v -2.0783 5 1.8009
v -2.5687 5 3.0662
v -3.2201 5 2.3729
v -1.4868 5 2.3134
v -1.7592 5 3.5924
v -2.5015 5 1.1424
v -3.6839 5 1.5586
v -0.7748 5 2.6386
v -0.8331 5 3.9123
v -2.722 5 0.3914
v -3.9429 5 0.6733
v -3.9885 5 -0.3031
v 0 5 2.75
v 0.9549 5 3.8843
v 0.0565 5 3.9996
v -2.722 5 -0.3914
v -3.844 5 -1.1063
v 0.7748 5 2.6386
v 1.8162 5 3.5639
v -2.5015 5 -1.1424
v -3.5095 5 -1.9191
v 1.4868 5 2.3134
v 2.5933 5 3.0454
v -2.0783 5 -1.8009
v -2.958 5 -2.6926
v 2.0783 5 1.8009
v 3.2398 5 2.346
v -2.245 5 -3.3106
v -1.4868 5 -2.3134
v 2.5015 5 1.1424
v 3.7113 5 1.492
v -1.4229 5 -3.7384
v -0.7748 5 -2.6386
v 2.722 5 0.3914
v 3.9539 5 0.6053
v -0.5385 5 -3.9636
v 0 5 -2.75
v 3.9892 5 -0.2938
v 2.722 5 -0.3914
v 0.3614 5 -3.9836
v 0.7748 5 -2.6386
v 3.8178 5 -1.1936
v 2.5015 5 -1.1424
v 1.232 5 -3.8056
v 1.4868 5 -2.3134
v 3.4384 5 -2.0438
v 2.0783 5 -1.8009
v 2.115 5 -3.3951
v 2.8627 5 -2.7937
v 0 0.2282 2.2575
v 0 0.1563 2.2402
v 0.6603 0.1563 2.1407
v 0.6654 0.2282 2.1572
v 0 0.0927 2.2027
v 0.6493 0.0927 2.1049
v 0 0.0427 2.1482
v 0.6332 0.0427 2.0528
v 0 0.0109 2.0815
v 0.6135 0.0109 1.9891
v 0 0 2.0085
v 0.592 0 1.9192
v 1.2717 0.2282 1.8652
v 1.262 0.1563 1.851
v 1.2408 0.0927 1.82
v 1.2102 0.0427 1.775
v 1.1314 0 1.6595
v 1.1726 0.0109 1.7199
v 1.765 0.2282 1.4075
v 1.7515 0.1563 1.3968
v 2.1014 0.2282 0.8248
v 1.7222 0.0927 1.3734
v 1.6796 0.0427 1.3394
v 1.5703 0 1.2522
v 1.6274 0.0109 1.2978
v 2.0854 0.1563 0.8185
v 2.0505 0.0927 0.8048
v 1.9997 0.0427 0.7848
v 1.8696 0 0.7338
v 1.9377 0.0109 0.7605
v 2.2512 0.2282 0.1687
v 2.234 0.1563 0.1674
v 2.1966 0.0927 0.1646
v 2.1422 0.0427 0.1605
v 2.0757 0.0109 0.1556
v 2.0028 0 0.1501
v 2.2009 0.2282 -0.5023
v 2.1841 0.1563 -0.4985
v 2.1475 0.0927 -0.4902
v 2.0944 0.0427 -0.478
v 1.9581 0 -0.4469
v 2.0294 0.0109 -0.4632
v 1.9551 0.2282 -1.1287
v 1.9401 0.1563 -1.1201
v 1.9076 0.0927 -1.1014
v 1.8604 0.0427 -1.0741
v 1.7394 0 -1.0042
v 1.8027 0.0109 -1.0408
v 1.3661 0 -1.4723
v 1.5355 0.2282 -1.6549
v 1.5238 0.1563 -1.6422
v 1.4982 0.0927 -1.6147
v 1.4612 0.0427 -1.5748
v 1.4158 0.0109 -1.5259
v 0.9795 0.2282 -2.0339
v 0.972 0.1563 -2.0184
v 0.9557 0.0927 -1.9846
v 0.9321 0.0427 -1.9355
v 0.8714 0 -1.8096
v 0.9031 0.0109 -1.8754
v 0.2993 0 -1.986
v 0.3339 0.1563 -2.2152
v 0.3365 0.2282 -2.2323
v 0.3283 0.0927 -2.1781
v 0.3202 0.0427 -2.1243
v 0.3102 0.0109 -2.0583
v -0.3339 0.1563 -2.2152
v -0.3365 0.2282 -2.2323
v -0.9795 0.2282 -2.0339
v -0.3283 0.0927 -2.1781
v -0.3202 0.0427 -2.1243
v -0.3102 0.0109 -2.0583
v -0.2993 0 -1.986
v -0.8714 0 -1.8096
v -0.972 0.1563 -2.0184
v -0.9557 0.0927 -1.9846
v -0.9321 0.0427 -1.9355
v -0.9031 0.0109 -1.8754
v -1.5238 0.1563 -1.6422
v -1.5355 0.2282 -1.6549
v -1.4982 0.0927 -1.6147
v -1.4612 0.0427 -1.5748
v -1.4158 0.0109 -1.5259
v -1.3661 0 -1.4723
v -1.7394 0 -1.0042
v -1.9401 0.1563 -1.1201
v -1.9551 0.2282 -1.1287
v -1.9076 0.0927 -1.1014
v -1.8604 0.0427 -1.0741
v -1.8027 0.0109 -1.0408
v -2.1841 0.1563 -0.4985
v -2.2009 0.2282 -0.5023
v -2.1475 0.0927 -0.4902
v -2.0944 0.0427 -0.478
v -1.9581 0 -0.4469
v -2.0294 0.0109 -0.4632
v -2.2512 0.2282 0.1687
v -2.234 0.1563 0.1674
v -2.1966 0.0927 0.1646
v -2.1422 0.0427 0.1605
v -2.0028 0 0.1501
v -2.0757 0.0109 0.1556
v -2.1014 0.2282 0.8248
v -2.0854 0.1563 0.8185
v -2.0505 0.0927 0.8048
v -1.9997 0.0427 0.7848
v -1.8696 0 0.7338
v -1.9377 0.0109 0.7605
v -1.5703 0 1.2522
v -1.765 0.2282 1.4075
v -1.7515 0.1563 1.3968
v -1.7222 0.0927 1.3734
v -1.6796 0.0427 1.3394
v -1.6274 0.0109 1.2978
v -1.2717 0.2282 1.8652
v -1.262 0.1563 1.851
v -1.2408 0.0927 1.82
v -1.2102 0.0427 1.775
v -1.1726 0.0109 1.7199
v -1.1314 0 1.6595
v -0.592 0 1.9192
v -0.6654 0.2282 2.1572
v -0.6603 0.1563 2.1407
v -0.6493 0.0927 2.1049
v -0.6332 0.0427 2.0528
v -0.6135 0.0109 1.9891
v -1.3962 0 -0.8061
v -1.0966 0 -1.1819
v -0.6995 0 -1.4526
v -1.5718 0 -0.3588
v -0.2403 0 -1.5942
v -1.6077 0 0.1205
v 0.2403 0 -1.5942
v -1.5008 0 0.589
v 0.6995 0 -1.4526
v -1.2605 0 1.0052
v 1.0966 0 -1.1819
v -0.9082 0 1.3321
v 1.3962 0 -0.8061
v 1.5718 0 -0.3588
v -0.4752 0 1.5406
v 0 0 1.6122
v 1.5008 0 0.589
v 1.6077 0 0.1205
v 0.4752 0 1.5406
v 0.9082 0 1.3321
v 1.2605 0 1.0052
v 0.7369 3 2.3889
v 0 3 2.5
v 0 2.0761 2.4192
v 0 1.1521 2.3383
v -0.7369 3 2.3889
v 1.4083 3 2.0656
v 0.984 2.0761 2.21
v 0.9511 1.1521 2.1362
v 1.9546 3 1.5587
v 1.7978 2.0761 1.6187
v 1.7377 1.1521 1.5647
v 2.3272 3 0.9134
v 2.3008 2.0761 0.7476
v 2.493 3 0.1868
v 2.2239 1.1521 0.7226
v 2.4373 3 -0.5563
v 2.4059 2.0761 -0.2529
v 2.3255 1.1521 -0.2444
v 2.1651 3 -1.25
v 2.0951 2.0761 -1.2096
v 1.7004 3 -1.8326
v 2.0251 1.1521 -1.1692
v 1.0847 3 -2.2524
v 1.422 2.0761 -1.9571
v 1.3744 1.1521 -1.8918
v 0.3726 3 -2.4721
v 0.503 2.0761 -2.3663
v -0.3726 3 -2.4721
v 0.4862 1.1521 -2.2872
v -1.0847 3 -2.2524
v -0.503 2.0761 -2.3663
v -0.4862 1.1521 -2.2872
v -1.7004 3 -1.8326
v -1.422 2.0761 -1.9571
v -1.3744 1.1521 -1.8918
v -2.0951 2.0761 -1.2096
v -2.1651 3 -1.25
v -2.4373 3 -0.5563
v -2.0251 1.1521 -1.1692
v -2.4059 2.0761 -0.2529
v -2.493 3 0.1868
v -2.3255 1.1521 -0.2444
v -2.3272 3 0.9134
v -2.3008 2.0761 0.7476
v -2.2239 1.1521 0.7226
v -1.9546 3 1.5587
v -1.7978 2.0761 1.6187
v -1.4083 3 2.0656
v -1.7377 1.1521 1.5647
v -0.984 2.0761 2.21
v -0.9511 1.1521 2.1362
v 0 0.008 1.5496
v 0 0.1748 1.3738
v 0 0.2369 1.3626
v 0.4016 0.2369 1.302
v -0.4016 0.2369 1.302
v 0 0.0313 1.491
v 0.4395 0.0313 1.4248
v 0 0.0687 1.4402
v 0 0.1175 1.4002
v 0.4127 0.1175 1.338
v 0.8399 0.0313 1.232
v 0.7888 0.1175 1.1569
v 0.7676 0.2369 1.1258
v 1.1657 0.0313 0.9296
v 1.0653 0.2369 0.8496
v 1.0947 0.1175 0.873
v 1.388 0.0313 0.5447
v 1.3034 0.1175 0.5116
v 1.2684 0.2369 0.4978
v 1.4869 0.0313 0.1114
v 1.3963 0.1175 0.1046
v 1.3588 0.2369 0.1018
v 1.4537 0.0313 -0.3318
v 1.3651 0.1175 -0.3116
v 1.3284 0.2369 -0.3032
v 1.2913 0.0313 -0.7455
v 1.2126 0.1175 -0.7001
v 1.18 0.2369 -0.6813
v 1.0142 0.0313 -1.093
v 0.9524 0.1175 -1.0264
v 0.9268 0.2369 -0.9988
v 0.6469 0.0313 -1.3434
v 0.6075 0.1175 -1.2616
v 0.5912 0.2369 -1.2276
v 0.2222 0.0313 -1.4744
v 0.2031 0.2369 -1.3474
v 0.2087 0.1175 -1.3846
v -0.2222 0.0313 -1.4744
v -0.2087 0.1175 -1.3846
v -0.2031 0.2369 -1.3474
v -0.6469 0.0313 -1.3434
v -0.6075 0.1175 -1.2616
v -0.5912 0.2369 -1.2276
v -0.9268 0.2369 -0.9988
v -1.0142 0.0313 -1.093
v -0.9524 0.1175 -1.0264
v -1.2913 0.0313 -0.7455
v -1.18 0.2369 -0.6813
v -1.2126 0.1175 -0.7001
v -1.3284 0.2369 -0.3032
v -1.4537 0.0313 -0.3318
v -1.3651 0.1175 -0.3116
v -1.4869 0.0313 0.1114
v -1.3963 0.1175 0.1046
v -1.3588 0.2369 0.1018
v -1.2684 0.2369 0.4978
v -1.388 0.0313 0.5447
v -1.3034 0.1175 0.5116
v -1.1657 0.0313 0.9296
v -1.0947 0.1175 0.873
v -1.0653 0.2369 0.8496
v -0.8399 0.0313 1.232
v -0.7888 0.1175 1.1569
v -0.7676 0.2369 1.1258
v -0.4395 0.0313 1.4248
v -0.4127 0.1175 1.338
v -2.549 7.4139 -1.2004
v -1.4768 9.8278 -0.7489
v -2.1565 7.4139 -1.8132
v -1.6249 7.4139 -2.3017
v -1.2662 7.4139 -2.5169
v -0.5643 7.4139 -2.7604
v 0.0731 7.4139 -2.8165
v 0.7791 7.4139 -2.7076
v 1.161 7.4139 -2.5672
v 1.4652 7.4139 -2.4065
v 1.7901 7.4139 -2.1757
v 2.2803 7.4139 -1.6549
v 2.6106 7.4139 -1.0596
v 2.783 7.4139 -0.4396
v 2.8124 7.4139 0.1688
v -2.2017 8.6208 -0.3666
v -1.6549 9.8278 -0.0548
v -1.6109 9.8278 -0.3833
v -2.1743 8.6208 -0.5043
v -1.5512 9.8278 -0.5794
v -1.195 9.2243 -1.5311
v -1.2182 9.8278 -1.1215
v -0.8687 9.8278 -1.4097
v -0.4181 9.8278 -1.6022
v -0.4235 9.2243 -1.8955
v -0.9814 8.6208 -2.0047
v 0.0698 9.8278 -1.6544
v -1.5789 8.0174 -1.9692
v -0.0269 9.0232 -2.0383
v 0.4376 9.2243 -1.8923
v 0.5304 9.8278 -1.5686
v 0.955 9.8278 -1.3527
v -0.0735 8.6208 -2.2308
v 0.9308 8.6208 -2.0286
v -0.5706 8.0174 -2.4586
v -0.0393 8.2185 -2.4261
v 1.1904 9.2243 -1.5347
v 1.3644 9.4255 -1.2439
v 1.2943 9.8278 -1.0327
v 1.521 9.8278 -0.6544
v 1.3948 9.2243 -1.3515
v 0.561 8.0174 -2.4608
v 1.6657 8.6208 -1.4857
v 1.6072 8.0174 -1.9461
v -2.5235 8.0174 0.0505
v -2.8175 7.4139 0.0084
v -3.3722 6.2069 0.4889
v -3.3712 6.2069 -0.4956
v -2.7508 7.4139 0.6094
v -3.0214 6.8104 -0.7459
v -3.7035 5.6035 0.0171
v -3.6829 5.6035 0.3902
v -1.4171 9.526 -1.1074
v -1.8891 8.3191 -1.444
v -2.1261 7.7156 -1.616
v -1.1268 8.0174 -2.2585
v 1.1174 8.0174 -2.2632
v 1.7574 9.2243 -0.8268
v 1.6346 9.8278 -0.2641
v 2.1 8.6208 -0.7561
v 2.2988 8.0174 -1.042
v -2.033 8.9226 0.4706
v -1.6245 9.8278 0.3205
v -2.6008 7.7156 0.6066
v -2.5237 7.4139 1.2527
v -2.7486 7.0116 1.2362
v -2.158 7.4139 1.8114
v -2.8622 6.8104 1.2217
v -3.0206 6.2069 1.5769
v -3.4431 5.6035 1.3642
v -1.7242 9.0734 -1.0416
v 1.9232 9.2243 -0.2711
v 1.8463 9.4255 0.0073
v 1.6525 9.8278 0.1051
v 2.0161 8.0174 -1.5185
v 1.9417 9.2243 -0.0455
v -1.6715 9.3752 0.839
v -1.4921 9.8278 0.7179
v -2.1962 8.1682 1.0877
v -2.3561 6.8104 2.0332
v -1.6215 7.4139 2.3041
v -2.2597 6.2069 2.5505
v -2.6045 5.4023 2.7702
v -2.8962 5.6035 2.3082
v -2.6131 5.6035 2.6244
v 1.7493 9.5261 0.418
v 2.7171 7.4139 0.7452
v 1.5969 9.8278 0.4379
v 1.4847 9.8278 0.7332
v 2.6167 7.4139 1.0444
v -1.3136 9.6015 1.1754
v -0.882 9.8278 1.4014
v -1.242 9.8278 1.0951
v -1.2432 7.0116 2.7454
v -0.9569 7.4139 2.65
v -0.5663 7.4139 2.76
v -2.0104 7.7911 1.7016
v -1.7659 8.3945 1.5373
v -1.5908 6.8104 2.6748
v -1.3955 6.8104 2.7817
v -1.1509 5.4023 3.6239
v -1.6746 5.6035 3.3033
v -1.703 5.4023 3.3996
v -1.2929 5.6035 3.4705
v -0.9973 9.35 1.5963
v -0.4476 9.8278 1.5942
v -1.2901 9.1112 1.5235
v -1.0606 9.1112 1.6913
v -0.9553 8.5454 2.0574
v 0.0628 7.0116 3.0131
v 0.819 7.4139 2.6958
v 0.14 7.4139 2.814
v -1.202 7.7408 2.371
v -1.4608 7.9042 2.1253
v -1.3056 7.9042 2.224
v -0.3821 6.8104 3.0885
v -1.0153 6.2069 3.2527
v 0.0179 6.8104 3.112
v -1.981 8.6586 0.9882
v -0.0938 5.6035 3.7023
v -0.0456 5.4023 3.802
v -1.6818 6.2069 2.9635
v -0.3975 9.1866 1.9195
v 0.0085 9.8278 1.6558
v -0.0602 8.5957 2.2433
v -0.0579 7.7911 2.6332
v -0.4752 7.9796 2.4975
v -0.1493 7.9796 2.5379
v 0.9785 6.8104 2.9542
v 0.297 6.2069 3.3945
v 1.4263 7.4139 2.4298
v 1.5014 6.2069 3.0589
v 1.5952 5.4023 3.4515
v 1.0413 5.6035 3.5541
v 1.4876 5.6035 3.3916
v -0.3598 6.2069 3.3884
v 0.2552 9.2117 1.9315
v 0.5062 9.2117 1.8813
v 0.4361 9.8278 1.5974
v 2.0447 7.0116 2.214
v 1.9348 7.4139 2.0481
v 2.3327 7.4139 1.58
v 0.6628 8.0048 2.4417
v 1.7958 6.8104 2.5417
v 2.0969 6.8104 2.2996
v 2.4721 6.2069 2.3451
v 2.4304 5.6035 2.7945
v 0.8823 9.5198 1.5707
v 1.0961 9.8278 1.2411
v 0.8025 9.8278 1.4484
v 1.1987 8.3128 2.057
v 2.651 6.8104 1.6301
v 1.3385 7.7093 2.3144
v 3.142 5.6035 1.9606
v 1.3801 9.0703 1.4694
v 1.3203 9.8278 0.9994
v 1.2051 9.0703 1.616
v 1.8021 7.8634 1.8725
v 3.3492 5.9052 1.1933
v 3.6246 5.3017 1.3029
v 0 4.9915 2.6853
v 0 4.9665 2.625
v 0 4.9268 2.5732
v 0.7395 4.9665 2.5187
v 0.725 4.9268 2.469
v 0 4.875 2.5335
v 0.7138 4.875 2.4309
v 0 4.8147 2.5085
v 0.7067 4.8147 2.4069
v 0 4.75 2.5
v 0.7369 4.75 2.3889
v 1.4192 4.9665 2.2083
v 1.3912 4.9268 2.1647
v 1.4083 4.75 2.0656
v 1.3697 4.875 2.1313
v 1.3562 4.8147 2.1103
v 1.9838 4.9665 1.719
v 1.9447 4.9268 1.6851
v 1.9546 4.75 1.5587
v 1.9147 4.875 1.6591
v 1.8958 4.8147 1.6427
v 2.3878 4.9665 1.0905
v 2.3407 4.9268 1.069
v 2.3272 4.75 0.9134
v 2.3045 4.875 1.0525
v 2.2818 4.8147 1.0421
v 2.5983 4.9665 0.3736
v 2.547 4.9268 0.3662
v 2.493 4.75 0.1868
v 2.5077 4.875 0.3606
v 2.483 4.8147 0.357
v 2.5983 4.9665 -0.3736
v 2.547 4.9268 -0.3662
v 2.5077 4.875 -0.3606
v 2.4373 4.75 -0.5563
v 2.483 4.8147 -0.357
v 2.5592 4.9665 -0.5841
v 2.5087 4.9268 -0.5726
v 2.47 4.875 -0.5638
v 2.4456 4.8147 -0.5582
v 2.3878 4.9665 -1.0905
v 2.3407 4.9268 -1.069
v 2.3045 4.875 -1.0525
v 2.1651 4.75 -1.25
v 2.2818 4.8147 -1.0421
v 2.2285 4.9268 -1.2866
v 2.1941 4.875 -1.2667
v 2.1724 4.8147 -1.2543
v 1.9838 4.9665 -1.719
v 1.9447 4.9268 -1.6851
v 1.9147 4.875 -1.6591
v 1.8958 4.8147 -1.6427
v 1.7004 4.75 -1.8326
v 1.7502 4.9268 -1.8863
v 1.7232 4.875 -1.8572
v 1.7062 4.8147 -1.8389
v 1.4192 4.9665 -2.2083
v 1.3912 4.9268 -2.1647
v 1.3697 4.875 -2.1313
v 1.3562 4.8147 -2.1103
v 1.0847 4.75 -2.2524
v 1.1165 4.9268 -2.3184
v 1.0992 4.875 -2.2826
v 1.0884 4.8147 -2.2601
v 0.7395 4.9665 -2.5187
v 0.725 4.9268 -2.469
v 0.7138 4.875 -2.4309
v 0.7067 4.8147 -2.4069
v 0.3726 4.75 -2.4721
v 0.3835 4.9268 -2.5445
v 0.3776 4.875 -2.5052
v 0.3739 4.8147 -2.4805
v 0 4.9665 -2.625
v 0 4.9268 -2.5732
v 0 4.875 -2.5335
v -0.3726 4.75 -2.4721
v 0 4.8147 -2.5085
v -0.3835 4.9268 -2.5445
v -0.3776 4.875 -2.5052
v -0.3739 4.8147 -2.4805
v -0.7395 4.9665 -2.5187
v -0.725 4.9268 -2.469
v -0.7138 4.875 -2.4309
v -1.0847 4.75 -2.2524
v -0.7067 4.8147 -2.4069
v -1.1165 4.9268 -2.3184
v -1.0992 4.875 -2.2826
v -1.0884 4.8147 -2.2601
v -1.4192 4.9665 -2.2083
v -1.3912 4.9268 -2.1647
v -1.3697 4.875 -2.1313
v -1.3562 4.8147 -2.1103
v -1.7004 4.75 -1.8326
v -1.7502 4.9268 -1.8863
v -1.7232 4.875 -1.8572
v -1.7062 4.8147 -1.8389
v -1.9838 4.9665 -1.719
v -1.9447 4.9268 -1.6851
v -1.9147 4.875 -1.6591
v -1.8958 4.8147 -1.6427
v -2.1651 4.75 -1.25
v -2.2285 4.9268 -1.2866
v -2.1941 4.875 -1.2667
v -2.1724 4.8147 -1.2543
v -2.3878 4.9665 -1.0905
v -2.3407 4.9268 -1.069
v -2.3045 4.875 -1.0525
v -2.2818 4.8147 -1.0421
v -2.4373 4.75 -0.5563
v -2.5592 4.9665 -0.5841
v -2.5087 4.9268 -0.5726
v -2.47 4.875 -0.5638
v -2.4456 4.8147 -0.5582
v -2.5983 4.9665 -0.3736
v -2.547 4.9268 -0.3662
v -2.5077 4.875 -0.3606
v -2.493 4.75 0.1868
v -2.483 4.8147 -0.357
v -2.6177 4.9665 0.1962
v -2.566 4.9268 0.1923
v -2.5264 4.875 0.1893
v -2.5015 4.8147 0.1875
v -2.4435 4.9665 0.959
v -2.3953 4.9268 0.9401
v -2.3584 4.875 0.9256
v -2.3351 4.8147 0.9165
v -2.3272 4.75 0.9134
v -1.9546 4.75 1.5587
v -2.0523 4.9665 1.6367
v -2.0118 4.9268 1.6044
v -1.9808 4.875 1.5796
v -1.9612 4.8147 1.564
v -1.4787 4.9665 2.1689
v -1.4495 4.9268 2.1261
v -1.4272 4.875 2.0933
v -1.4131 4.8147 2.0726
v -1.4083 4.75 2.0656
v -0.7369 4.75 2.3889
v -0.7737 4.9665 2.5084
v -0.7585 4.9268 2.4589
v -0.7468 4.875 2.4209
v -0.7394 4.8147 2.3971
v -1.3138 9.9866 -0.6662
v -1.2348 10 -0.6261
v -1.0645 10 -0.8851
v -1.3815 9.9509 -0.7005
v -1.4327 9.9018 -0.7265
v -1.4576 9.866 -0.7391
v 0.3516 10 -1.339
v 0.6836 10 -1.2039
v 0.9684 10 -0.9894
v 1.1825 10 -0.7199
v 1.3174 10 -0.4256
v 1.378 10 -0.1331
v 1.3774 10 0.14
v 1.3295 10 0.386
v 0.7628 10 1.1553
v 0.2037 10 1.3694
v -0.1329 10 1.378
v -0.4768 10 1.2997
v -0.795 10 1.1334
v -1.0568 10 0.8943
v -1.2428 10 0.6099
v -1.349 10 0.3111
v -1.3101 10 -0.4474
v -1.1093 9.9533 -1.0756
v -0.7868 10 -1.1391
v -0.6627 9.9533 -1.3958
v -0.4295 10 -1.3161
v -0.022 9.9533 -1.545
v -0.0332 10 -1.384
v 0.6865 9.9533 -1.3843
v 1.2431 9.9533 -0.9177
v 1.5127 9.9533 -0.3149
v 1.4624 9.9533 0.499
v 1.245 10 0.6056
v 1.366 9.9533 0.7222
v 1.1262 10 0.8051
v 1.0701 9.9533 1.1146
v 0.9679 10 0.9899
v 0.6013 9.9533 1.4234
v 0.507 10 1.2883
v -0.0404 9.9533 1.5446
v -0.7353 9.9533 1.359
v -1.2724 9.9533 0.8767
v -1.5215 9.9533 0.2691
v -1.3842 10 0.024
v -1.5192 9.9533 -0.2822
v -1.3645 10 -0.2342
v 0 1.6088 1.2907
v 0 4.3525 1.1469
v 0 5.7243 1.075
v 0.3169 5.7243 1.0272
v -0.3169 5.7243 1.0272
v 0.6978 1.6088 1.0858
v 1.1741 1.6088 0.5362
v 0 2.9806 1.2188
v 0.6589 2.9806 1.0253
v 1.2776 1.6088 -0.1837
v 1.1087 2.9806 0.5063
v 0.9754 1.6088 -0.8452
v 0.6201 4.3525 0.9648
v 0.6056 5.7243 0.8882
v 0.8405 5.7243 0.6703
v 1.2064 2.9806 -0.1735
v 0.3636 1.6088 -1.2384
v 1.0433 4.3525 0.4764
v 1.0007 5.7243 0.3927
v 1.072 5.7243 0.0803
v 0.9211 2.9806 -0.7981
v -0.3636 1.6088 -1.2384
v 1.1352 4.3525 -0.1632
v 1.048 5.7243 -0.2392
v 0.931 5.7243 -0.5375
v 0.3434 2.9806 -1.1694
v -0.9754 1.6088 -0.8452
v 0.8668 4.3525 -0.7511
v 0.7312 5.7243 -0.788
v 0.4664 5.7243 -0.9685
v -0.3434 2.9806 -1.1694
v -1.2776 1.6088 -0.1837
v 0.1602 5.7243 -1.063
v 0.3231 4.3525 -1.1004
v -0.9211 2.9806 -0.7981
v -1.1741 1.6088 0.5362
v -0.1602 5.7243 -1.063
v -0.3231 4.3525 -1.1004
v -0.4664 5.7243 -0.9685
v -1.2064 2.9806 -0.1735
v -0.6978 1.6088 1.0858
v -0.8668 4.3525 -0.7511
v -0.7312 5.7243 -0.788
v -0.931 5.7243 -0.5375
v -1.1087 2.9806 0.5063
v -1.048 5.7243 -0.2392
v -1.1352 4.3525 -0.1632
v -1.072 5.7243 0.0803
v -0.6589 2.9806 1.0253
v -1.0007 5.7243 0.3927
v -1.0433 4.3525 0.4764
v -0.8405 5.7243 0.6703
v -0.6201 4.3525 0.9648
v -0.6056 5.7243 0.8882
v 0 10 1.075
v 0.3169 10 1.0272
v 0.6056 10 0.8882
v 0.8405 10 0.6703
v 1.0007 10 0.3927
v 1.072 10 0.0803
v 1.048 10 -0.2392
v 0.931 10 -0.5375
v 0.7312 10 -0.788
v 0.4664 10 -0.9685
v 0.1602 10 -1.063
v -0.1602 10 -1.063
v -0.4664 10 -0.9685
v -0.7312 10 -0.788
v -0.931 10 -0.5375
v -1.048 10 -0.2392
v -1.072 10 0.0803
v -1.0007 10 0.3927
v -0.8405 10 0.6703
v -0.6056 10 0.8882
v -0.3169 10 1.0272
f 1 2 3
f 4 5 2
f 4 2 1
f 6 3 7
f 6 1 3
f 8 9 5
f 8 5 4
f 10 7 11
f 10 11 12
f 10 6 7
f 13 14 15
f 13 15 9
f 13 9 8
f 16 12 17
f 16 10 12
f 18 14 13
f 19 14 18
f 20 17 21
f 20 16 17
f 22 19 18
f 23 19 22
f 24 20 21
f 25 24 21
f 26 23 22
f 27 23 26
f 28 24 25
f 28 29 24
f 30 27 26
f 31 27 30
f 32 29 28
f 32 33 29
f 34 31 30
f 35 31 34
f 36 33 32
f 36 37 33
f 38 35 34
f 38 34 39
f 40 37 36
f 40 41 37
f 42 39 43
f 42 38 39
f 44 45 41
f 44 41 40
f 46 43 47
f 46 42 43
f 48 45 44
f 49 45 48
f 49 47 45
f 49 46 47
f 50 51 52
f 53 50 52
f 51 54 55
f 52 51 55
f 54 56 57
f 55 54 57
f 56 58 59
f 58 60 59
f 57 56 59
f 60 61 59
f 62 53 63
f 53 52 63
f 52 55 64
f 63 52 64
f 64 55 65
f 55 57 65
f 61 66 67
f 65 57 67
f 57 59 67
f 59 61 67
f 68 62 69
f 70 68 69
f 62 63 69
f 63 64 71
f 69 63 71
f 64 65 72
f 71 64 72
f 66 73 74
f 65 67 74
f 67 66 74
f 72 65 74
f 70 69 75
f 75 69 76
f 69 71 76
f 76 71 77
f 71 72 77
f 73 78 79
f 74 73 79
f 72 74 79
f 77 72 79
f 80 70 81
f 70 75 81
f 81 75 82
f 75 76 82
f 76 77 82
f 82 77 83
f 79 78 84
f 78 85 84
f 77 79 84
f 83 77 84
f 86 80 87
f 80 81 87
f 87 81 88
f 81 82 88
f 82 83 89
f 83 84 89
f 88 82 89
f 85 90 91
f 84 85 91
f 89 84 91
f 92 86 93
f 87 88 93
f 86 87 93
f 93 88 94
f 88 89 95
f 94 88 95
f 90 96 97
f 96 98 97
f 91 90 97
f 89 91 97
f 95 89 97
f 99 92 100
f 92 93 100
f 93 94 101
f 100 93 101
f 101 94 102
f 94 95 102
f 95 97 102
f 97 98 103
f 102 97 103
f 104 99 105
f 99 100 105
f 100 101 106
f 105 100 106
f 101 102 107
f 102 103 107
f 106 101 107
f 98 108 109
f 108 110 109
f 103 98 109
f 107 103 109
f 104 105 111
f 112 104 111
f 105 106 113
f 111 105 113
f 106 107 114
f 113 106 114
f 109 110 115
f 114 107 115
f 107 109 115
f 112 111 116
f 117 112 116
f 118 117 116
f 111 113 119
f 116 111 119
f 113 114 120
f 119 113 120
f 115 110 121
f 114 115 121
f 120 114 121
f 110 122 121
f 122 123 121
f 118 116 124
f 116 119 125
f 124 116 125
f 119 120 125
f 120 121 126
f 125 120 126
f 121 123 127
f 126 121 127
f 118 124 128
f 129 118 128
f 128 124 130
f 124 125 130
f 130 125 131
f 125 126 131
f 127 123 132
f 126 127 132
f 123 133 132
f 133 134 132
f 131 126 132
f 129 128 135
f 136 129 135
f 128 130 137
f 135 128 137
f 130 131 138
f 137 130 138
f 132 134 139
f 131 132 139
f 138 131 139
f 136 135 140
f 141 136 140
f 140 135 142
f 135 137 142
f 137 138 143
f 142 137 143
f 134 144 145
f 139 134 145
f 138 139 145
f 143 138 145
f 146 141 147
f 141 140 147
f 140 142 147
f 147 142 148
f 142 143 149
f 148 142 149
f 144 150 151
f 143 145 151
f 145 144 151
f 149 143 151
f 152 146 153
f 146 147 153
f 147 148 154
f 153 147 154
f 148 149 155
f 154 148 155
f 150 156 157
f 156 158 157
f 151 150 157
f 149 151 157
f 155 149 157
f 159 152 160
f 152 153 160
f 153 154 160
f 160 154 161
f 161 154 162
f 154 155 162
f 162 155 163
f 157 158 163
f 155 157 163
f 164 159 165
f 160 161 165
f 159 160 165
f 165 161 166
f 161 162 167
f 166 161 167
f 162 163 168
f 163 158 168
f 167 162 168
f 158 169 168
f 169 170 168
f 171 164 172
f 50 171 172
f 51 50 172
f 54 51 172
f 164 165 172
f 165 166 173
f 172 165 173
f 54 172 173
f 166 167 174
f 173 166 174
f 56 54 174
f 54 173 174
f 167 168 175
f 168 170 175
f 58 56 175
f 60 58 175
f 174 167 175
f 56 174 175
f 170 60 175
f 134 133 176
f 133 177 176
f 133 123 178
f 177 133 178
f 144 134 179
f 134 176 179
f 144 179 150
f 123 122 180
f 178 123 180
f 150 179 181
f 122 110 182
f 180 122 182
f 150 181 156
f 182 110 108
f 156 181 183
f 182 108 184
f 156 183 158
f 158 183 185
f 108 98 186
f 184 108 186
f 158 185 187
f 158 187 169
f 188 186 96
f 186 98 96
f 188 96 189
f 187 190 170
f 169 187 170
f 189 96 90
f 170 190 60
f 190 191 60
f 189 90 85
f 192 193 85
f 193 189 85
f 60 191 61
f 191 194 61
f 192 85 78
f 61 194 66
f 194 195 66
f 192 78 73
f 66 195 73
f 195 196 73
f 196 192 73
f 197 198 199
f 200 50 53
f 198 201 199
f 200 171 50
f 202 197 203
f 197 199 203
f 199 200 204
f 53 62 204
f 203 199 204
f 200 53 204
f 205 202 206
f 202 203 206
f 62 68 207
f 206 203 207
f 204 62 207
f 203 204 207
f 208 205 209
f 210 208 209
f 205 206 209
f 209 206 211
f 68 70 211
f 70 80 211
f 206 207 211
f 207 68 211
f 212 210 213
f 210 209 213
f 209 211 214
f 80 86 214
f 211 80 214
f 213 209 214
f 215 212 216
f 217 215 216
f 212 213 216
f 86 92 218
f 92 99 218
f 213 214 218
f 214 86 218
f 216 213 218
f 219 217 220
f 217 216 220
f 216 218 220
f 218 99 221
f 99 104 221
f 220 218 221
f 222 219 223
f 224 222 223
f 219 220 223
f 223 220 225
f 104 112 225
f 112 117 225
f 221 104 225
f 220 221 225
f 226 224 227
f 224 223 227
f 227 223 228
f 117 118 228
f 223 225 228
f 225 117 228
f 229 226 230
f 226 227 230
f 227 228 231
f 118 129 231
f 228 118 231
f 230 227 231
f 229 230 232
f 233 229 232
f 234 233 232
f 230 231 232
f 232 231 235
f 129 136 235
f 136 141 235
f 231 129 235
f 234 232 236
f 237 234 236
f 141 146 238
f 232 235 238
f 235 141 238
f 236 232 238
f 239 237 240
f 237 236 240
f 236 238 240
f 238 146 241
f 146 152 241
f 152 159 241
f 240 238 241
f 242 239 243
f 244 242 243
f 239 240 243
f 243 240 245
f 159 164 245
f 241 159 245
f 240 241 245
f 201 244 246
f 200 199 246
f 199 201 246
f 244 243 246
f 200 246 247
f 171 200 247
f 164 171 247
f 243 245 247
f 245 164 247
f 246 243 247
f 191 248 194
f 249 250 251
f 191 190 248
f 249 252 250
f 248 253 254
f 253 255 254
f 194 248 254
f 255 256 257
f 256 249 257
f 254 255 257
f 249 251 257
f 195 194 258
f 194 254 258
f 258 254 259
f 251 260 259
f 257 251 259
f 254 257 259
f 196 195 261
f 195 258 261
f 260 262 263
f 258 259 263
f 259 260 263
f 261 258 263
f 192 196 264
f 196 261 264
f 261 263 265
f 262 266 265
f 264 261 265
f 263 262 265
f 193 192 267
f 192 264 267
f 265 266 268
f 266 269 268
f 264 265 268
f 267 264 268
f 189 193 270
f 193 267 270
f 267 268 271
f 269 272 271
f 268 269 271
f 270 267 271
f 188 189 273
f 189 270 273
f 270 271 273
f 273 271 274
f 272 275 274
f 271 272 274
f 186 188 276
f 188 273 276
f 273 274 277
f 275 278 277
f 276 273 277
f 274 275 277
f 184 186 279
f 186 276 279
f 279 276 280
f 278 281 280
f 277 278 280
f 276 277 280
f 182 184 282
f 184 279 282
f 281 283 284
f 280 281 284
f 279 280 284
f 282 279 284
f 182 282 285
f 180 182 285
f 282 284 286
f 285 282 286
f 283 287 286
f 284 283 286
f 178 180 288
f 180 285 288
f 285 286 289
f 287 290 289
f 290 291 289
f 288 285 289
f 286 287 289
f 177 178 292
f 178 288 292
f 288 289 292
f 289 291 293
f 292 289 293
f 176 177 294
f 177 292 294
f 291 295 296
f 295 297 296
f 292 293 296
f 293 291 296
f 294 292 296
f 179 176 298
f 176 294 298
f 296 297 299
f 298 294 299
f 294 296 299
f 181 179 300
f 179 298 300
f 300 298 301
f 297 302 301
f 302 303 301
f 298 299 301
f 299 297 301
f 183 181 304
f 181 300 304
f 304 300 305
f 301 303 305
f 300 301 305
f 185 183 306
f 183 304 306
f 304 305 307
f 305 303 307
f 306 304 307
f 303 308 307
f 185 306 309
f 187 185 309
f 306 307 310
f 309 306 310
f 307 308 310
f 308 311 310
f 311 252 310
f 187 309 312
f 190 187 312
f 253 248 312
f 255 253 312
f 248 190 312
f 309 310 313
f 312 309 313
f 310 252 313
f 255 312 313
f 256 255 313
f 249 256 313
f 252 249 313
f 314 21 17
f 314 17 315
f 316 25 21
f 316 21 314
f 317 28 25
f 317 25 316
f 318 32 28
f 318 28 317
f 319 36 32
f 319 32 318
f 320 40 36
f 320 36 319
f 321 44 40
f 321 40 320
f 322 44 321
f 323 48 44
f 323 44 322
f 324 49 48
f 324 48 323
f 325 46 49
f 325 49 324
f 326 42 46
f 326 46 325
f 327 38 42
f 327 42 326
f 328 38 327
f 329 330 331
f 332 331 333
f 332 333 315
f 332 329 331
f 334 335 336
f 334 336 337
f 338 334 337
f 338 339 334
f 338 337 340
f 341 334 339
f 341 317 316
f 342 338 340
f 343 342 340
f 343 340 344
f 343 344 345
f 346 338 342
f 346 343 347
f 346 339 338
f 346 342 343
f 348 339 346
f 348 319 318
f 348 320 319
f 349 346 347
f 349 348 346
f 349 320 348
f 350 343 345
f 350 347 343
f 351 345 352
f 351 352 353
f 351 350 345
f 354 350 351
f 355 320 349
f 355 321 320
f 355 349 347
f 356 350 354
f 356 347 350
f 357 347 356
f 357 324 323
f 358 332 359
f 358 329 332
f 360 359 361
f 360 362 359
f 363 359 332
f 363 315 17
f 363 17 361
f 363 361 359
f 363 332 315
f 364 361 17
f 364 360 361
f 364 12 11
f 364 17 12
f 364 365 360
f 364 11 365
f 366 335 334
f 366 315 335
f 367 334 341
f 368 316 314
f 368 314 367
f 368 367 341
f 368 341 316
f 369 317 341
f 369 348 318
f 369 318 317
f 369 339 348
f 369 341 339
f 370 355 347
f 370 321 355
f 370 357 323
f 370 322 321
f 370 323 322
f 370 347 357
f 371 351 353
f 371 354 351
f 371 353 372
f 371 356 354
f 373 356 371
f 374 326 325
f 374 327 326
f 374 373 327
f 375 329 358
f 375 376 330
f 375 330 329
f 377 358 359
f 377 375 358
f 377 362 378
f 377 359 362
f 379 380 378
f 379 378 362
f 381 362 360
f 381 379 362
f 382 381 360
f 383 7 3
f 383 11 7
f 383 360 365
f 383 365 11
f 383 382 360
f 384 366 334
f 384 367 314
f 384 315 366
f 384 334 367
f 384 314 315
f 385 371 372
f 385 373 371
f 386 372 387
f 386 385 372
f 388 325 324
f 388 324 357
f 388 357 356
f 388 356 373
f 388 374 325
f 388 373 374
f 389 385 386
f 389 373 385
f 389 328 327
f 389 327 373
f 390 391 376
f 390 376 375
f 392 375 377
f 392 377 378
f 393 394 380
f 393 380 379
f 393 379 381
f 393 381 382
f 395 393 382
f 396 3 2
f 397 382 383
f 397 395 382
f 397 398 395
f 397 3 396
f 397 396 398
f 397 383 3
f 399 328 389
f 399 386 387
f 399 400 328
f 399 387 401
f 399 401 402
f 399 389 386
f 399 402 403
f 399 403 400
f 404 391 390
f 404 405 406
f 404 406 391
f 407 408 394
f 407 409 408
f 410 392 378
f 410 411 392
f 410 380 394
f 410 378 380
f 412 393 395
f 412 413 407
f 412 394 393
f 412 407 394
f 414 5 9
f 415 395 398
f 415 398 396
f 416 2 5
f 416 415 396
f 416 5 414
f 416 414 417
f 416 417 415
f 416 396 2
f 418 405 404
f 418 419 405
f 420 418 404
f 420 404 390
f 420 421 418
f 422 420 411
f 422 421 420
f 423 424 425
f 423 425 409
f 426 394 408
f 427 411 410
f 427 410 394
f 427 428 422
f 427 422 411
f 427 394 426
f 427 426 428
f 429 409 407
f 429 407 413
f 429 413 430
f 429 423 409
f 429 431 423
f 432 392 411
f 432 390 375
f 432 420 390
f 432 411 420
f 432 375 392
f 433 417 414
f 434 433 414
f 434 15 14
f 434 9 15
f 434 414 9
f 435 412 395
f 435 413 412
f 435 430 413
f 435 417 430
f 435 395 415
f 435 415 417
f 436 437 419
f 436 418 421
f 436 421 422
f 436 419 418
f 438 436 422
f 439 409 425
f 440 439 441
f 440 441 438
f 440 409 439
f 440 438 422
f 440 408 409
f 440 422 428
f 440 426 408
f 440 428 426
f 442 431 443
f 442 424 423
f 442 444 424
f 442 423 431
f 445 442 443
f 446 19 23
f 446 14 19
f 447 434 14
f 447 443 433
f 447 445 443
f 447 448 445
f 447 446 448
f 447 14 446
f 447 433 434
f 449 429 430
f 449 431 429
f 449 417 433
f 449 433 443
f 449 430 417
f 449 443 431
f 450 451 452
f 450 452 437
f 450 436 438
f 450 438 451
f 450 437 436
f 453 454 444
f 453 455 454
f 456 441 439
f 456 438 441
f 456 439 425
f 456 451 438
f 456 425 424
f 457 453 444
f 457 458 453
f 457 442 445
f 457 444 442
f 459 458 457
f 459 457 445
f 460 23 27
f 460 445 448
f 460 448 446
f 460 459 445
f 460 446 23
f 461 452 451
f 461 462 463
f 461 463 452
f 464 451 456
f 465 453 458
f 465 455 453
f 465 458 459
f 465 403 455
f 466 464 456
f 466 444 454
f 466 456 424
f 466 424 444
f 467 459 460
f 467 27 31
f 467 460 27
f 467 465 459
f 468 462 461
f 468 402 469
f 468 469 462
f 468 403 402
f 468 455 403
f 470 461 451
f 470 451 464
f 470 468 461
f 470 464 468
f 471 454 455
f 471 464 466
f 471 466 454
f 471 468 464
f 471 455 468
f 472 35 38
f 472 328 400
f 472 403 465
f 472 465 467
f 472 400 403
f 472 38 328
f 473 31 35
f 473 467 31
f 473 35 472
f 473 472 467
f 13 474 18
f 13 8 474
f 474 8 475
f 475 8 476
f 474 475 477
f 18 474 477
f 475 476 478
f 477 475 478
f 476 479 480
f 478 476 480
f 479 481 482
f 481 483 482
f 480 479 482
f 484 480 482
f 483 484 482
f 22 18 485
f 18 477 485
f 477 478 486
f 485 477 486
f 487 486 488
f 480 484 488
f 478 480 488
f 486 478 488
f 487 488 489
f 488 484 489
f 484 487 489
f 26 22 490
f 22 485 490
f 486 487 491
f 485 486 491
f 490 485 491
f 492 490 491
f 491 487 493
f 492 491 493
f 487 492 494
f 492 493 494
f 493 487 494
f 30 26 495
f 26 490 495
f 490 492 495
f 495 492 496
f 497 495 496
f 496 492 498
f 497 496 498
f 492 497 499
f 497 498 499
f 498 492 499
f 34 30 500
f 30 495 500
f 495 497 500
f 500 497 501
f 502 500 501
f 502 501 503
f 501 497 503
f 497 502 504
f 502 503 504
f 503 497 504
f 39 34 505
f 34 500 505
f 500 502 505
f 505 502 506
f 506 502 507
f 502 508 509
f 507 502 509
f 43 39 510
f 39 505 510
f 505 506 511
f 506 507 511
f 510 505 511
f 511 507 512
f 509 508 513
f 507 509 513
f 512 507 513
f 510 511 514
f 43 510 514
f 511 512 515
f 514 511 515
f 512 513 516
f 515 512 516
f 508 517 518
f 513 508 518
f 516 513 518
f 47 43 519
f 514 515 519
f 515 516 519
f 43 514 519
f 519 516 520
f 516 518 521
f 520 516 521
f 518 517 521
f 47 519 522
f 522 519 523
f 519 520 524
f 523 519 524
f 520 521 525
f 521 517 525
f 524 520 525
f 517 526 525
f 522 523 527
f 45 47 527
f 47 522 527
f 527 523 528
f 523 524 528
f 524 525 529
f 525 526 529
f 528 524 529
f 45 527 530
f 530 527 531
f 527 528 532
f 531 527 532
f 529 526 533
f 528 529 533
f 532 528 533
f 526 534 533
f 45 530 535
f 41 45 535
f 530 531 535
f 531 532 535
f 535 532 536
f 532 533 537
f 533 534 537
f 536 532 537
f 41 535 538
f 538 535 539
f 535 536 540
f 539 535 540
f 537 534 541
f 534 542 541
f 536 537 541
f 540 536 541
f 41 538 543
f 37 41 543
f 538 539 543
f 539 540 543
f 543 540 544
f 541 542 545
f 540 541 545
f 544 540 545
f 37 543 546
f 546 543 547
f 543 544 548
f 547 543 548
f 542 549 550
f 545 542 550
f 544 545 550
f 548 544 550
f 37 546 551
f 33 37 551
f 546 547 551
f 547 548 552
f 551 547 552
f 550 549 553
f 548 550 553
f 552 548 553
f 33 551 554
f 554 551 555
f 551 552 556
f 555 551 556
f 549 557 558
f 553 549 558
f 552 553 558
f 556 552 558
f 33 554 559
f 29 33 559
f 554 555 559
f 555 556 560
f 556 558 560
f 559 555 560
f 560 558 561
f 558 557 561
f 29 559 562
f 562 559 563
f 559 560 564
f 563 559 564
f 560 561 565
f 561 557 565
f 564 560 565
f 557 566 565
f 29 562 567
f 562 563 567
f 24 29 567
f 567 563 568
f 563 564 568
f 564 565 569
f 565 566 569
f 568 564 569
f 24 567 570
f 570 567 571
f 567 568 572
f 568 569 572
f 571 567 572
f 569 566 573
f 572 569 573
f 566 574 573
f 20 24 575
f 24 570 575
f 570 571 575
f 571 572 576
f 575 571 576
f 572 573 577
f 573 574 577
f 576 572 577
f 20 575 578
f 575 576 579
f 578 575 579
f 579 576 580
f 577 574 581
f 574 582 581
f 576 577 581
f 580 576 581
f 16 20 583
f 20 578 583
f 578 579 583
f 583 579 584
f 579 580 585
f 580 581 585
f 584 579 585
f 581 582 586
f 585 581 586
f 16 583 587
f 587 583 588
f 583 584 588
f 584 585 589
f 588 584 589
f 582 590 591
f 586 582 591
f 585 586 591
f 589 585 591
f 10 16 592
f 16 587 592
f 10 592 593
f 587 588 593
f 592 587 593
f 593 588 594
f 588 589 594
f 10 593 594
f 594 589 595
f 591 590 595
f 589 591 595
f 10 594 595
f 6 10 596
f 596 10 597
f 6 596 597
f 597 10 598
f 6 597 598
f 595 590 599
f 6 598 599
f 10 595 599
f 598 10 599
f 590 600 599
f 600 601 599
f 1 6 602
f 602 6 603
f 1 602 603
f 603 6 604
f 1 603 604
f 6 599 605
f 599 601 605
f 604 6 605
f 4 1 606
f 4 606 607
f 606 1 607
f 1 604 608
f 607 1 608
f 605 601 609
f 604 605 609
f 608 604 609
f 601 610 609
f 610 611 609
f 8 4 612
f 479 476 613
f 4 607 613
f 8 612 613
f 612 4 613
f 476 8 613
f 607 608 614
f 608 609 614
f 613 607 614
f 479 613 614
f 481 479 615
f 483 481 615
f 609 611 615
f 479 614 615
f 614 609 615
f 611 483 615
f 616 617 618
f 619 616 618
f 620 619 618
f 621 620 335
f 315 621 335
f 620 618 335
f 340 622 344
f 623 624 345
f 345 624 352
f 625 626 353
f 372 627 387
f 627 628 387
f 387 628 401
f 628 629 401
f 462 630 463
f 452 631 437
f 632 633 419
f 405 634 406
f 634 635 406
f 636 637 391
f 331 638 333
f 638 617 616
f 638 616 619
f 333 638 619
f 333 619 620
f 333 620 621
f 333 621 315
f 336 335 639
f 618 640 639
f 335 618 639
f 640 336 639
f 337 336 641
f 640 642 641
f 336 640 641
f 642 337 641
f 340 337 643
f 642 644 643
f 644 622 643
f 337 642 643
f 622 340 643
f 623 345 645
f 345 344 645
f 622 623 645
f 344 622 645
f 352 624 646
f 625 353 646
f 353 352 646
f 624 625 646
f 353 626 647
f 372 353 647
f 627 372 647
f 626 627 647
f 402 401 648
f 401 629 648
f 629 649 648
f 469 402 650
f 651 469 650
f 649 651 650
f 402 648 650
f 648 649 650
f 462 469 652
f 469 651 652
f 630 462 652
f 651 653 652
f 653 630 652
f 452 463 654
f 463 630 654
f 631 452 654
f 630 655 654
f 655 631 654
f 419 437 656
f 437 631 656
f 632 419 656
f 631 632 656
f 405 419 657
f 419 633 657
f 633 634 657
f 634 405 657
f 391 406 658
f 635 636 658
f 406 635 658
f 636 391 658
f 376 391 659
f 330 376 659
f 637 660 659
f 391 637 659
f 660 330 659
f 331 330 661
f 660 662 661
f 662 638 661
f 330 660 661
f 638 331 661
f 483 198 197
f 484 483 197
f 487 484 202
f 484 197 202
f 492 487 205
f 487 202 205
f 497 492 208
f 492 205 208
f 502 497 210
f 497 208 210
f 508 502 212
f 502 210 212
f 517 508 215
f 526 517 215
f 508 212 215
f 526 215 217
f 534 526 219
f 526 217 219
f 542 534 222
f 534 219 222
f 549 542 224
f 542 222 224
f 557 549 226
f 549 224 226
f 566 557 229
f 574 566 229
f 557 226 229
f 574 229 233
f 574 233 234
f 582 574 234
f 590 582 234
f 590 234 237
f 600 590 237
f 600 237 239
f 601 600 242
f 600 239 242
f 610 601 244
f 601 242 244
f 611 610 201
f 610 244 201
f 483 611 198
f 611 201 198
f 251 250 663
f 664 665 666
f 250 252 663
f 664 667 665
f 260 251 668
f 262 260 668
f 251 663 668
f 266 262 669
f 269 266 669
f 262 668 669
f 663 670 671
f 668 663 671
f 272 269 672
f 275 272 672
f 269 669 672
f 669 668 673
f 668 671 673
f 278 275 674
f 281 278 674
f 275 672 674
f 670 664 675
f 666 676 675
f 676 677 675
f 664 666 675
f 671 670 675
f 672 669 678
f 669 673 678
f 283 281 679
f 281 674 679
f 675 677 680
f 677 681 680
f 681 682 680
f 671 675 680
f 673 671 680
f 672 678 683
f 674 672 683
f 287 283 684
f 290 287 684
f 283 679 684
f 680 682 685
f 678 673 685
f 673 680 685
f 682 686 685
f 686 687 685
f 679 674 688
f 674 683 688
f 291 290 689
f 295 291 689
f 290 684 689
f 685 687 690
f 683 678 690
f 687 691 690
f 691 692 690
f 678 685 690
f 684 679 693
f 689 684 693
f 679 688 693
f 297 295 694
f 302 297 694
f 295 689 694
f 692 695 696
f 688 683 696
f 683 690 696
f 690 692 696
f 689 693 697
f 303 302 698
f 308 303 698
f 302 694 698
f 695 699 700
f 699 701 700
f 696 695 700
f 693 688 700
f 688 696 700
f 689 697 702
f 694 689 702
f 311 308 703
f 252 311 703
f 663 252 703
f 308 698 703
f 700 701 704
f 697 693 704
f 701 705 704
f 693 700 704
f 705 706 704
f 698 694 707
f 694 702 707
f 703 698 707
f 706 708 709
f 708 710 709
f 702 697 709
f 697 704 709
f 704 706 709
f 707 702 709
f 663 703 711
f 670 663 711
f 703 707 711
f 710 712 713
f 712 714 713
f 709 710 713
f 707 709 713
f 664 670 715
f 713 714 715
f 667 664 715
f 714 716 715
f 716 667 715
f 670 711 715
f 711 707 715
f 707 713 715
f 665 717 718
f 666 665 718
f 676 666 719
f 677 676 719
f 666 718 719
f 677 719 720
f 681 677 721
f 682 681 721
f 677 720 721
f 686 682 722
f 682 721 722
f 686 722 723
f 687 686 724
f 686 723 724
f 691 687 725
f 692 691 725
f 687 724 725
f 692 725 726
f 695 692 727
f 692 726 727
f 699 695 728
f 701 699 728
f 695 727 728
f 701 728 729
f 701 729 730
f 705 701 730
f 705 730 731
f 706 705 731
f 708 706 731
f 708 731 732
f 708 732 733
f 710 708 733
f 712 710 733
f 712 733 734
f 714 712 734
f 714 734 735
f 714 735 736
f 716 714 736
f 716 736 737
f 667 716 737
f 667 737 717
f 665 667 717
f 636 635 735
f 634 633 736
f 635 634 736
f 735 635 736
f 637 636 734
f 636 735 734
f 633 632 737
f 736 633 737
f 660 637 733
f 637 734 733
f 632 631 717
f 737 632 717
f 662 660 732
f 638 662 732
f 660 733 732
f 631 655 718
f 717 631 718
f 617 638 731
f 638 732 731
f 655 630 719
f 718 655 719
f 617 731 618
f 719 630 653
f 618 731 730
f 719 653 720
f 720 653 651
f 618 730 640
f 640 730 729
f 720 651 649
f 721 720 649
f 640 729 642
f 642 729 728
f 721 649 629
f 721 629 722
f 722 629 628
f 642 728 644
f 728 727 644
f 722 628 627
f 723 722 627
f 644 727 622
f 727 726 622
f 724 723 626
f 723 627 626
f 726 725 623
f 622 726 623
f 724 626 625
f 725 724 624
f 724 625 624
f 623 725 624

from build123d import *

# Parameters (mm, degrees)
SKETCH1_R           = 2.5
BOSS_EXTRUDE1_DEPTH = 5
SKETCH4_R           = 1.075
CUT_EXTRUDE1_DEPTH  = 12.489125363
CHAMFER1_SIZE       = 0.3
CHAMFER1_SIZE2      = 5.724341006
CHAMFER2_SIZE       = 3
CHAMFER2_SIZE2      = 0.262465991
FILLET1_R           = 0.3
FILLET2_R           = 0.25
FILLET4_R           = 0.25


with BuildPart() as part:
    # Sketch1 → Boss-Extrude1 (new body)
    with BuildSketch(Plane(origin=(0, 0, 0), x_dir=(1, 0, 0), z_dir=(0, 1, 0))):
        with Locations(Location((0, 0, 0), (0, 0, 270))):
            Circle(SKETCH1_R)
    extrude(amount=BOSS_EXTRUDE1_DEPTH)

    # Loft1: read off the stored shape, not the designer's step
    # Loft1: loft between two sections, ruled curve by curve
    loft1_from = [
        Edge.make_bspline([(-1.392393657, 10, -0.736114736), (0.079835815, 10, -3.52090205), (2.864623129, 10, -2.048672577), (1.392393657, 10, 0.736114736), (-0.079835815, 10, 3.52090205), (-2.864623129, 10, 2.048672577), (-1.392393657, 10, -0.736114736)], [0, 0, 0, 0, 0.5, 0.5, 0.5, 1, 1, 1, 1], 3, [1, 0.333333333, 0.333333333, 1, 0.333333333, 0.333333333, 1]),
    ]
    loft1_to = [
        Edge.make_bspline([(-3.843967333, 5, -1.106306985), (-1.631353363, 5, -8.79424165), (6.056581302, 5, -6.581627681), (3.843967333, 5, 1.106306985), (1.631353363, 5, 8.79424165), (-6.056581302, 5, 6.581627681), (-3.843967333, 5, -1.106306985)], [0, 0, 0, 0, 0.5, 0.5, 0.5, 1, 1, 1, 1], 3, [1, 0.333333333, 0.333333333, 1, 0.333333333, 0.333333333, 1]),
    ]
    loft1 = Solid(Shell([*[Face.make_surface_from_curves(loft1_from[k], loft1_to[k]) for k in range(1)], Face(Wire(loft1_from)), Face(Wire(loft1_to))]))
    add(loft1)

    # Sketch4 → Cut-Extrude1 (cut, through all)
    with BuildSketch(Plane(origin=(0, 10, 0), x_dir=(1, 0, 0), z_dir=(0, 1, 0))):
        with Locations(Location((0, 0, 0), (0, 0, 270))):
            Circle(SKETCH4_R)
    extrude(amount=-CUT_EXTRUDE1_DEPTH, mode=Mode.SUBTRACT)

    # Chamfer1
    chamfer1_edges = [part.edges().sort_by_distance(p)[0] for p in [
        (0, 0, -1.075),
    ]]
    chamfer1_side = [part.faces().sort_by_distance(p)[0] for p in [
        (0, 0, -2.429289322),
    ]]
    chamfer(chamfer1_edges, length=CHAMFER1_SIZE, length2=CHAMFER1_SIZE2, reference=chamfer1_side[0])

    # Chamfer2
    chamfer2_edges = [part.edges().sort_by_distance(p)[0] for p in [
        (0, 0, -2.5),
    ]]
    chamfer2_side = [part.faces().sort_by_distance(p)[0] for p in [
        (0, 2.5, -2.5),
    ]]
    chamfer(chamfer2_edges, length=CHAMFER2_SIZE, length2=CHAMFER2_SIZE2, reference=chamfer2_side[0])

    # Fillet1
    fillet1_edges = [part.edges().sort_by_distance(p)[0] for p in [
        (1.392393657, 10, 0.736114736),
    ]]
    fillet(fillet1_edges, radius=FILLET1_R)

    # Fillet2
    fillet2_edges = [part.edges().sort_by_distance(p)[0] for p in [
        (0, 5, -2.5),
    ]]
    fillet(fillet2_edges, radius=FILLET2_R)

    # Fillet4
    fillet4_edges = [part.edges().sort_by_distance(p)[0] for p in [
        (0, 0, -1.375),
        (0, 0, -2.237534009),
    ]]
    fillet(fillet4_edges, radius=FILLET4_R)


solid = part.part
